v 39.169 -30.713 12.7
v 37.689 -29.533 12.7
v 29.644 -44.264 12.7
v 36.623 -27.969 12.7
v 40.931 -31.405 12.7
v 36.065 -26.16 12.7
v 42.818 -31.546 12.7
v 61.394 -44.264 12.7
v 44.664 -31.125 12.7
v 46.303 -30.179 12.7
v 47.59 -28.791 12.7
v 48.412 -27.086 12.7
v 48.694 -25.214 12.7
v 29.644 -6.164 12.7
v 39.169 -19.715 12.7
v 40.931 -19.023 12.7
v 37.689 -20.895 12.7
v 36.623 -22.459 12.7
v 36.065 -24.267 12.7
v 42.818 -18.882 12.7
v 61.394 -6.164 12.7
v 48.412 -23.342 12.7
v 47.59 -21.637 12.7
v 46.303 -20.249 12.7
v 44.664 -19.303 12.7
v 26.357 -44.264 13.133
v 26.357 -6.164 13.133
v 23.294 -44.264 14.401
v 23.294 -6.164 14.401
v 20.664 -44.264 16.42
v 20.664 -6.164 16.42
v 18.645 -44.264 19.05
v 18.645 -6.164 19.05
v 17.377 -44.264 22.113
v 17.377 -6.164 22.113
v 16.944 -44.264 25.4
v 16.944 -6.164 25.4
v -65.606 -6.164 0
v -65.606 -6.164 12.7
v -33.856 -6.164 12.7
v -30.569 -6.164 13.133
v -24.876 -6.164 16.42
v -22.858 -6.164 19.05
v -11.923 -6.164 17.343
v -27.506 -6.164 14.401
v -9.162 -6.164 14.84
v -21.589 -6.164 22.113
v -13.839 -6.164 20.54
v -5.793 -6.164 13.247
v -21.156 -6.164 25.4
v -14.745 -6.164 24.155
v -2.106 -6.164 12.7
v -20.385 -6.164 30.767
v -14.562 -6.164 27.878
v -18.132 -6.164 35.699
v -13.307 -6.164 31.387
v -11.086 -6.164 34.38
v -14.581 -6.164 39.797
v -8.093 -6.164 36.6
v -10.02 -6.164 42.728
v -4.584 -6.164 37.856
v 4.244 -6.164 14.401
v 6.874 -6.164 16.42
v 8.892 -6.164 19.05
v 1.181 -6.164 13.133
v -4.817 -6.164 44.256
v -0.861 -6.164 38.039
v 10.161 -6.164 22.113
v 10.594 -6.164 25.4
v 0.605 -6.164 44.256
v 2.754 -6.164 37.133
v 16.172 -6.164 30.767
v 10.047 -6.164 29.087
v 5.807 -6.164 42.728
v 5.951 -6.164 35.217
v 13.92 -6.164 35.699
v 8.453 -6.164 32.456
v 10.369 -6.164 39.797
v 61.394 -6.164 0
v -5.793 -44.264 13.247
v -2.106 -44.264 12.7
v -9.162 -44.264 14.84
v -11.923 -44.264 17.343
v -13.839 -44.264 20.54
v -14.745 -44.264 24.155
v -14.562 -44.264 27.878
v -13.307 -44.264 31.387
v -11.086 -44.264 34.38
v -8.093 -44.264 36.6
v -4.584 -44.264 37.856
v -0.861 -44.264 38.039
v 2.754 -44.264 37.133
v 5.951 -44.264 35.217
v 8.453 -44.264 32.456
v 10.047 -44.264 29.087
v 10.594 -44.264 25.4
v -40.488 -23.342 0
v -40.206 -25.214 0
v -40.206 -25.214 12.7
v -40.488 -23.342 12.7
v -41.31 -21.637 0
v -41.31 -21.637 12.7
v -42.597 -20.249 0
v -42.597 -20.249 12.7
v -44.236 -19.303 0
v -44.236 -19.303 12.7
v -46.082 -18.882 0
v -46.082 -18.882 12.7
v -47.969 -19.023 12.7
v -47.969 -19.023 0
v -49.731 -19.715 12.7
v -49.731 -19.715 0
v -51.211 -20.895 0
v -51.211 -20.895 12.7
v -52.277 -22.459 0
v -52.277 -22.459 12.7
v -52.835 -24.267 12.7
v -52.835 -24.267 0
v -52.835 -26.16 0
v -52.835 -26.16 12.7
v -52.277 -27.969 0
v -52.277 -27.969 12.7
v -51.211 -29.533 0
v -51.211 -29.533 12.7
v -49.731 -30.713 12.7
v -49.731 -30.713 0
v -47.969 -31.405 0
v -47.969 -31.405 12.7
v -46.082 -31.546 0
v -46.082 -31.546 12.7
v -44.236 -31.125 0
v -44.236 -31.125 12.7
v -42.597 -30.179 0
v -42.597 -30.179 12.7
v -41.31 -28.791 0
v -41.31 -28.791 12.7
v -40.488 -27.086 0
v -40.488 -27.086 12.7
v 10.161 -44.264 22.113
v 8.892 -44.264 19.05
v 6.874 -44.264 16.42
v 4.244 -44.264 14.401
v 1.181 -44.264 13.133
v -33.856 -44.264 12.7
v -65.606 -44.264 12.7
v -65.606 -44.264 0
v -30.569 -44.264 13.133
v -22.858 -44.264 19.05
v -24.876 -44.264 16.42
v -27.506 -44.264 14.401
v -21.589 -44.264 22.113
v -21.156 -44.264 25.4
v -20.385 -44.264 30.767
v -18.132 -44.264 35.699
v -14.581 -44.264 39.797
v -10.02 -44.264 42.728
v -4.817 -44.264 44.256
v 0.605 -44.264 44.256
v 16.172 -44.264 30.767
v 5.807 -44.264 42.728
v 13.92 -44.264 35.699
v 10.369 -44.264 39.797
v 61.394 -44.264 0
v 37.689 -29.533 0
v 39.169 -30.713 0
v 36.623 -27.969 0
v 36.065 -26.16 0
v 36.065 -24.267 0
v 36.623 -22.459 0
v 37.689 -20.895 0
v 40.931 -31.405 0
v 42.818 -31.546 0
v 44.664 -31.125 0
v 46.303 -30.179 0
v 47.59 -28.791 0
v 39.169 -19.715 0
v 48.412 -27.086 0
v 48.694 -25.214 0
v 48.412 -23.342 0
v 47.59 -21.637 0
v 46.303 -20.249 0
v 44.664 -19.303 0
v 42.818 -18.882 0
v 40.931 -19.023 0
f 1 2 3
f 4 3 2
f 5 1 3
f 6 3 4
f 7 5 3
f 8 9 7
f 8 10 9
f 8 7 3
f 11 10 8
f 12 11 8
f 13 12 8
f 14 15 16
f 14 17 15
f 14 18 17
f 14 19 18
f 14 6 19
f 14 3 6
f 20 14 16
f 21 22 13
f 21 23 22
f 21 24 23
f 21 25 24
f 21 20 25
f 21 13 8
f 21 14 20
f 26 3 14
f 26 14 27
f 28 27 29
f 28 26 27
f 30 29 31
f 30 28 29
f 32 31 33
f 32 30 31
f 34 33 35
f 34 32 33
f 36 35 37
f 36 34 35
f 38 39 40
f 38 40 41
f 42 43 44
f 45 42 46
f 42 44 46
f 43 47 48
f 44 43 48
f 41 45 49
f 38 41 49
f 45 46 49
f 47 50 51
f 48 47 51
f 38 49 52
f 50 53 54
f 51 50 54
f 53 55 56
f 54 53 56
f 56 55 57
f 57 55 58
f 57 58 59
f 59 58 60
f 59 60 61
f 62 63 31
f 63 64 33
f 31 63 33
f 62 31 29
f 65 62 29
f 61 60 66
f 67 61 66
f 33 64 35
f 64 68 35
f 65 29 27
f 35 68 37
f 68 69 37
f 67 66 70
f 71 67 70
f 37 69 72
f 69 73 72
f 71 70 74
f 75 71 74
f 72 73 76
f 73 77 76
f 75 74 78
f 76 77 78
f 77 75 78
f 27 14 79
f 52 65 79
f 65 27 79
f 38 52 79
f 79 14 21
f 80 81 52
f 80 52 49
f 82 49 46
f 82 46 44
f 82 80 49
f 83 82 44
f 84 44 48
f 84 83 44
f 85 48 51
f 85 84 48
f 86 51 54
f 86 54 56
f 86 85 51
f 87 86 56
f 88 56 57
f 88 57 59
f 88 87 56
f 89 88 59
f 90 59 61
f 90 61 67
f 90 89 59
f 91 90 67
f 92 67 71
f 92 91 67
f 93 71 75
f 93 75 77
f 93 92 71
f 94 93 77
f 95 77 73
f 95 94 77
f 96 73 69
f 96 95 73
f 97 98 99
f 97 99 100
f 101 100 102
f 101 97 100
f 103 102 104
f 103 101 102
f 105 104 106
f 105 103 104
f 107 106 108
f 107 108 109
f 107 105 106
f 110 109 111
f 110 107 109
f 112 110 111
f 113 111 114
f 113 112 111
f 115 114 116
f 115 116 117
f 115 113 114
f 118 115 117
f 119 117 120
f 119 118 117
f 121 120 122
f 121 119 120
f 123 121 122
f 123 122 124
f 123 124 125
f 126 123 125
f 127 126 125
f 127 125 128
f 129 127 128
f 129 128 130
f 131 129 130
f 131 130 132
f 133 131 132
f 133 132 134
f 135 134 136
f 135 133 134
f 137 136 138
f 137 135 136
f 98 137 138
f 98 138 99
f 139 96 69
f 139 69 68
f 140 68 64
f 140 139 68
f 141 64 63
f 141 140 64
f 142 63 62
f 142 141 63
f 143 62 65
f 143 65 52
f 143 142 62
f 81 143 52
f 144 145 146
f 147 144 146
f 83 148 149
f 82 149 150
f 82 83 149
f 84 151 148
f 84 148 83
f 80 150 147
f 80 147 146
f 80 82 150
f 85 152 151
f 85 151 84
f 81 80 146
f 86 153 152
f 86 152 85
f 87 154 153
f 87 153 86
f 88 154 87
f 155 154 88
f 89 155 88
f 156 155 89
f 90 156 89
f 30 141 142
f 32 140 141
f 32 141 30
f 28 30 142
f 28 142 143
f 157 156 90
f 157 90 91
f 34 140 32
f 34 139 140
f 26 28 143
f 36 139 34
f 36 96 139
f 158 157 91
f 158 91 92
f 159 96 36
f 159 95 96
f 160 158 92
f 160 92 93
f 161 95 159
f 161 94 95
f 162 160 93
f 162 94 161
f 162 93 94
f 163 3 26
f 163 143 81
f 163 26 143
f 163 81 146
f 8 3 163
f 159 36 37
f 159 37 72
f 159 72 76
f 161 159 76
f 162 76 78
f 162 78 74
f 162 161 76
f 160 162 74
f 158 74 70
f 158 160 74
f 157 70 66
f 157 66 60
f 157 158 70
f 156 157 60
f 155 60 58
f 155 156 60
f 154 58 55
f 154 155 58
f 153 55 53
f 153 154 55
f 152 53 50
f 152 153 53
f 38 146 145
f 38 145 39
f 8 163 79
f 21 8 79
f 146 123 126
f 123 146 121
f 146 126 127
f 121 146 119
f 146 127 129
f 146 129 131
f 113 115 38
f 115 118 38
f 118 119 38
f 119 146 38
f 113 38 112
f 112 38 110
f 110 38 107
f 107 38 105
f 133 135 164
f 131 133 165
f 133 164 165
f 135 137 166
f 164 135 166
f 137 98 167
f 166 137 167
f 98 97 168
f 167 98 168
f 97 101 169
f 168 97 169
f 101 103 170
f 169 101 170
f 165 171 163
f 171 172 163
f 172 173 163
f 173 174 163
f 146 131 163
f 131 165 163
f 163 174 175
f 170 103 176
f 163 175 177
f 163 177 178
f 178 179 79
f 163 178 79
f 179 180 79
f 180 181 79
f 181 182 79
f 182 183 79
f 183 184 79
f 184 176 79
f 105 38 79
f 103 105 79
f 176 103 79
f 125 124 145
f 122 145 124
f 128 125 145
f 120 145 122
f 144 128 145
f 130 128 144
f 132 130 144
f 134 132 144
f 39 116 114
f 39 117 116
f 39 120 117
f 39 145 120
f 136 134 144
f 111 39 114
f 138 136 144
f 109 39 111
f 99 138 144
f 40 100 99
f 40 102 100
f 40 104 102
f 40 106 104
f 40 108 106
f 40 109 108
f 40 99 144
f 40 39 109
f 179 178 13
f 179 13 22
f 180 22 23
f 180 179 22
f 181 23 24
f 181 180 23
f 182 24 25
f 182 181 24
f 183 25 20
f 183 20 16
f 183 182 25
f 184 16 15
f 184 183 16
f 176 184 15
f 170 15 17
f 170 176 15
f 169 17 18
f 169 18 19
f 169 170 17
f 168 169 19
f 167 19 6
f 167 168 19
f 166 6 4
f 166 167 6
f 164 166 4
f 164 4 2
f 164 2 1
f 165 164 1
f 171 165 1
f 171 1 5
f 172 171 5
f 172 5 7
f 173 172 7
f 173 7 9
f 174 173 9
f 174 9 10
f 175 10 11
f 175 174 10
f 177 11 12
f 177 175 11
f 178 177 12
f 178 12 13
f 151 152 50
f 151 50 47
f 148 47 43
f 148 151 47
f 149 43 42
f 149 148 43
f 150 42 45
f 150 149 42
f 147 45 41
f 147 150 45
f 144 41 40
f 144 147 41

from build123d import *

# Parameters (mm, degrees)
F0_W     = 127
F0_H     = 38.1
F0_R     = 6.35
F1_DEPTH = 12.7
F3_DEPTH = 38.1


with BuildPart() as f1:
    # F0 (on Top) → F1 (new body)
    with BuildSketch(Plane.XY):
        with Locations((-2.1062232554, -25.2138755785)):
            Rectangle(F0_W, F0_H)
        with Locations((-46.5562232554, -25.2138755785)):
            Circle(F0_R, mode=Mode.SUBTRACT)
        with Locations((42.3437767446, -25.2138755785)):
            Circle(F0_R, mode=Mode.SUBTRACT)
    extrude(amount=F1_DEPTH)

    # F2 (on face) → F3 (join, through all)
    with BuildSketch(Plane.XZ.offset(44.2638755785)):
        with BuildLine():
            ThreePointArc((12.0928084017, 12.7), (15.6897601828, 18.6025391898), (16.9437767446, 25.4))
            ThreePointArc((16.9437767446, 25.4), (-2.1062232554, 44.45), (-21.1562232554, 25.4))
            ThreePointArc((-21.1562232554, 25.4), (-19.9022066936, 18.6025391898), (-16.3052549125, 12.7))
            Line((-16.3052549125, 12.7), (-2.1062232095, 12.7))
            Line((-2.1062232095, 12.7), (12.0928084017, 12.7))
        make_face()
        with BuildLine():
            ThreePointArc((10.5937767446, 25.4), (6.8740328819, 16.4197438952), (-2.1062232095, 12.7))
            ThreePointArc((-2.1062232095, 12.7), (-11.0864793927, 34.3802561048), (10.5937767446, 25.4))
        make_face(mode=Mode.SUBTRACT)
        with BuildLine():
            ThreePointArc((29.6437767446, 12.7), (20.6635206235, 16.4197438789), (16.9437767446, 25.4))
            ThreePointArc((16.9437767446, 25.4), (15.6897601828, 18.6025391898), (12.0928084017, 12.7))
            Line((12.0928084017, 12.7), (29.6437767446, 12.7))
        make_face()
        with BuildLine():
            ThreePointArc((-16.3052549125, 12.7), (-19.9022066936, 18.6025391898), (-21.1562232554, 25.4))
            ThreePointArc((-21.1562232554, 25.4), (-24.8759671343, 16.4197438789), (-33.8562232554, 12.7))
            Line((-33.8562232554, 12.7), (-16.3052549125, 12.7))
        make_face()
        with BuildLine():
            ThreePointArc((-16.3052549125, 12.7), (-2.1062232554, 6.35), (12.0928084017, 12.7))
            Line((12.0928084017, 12.7), (-2.1062232095, 12.7))
            Line((-2.1062232095, 12.7), (-16.3052549125, 12.7))
        make_face()
    extrude(amount=-F3_DEPTH)


solid = f1.part
